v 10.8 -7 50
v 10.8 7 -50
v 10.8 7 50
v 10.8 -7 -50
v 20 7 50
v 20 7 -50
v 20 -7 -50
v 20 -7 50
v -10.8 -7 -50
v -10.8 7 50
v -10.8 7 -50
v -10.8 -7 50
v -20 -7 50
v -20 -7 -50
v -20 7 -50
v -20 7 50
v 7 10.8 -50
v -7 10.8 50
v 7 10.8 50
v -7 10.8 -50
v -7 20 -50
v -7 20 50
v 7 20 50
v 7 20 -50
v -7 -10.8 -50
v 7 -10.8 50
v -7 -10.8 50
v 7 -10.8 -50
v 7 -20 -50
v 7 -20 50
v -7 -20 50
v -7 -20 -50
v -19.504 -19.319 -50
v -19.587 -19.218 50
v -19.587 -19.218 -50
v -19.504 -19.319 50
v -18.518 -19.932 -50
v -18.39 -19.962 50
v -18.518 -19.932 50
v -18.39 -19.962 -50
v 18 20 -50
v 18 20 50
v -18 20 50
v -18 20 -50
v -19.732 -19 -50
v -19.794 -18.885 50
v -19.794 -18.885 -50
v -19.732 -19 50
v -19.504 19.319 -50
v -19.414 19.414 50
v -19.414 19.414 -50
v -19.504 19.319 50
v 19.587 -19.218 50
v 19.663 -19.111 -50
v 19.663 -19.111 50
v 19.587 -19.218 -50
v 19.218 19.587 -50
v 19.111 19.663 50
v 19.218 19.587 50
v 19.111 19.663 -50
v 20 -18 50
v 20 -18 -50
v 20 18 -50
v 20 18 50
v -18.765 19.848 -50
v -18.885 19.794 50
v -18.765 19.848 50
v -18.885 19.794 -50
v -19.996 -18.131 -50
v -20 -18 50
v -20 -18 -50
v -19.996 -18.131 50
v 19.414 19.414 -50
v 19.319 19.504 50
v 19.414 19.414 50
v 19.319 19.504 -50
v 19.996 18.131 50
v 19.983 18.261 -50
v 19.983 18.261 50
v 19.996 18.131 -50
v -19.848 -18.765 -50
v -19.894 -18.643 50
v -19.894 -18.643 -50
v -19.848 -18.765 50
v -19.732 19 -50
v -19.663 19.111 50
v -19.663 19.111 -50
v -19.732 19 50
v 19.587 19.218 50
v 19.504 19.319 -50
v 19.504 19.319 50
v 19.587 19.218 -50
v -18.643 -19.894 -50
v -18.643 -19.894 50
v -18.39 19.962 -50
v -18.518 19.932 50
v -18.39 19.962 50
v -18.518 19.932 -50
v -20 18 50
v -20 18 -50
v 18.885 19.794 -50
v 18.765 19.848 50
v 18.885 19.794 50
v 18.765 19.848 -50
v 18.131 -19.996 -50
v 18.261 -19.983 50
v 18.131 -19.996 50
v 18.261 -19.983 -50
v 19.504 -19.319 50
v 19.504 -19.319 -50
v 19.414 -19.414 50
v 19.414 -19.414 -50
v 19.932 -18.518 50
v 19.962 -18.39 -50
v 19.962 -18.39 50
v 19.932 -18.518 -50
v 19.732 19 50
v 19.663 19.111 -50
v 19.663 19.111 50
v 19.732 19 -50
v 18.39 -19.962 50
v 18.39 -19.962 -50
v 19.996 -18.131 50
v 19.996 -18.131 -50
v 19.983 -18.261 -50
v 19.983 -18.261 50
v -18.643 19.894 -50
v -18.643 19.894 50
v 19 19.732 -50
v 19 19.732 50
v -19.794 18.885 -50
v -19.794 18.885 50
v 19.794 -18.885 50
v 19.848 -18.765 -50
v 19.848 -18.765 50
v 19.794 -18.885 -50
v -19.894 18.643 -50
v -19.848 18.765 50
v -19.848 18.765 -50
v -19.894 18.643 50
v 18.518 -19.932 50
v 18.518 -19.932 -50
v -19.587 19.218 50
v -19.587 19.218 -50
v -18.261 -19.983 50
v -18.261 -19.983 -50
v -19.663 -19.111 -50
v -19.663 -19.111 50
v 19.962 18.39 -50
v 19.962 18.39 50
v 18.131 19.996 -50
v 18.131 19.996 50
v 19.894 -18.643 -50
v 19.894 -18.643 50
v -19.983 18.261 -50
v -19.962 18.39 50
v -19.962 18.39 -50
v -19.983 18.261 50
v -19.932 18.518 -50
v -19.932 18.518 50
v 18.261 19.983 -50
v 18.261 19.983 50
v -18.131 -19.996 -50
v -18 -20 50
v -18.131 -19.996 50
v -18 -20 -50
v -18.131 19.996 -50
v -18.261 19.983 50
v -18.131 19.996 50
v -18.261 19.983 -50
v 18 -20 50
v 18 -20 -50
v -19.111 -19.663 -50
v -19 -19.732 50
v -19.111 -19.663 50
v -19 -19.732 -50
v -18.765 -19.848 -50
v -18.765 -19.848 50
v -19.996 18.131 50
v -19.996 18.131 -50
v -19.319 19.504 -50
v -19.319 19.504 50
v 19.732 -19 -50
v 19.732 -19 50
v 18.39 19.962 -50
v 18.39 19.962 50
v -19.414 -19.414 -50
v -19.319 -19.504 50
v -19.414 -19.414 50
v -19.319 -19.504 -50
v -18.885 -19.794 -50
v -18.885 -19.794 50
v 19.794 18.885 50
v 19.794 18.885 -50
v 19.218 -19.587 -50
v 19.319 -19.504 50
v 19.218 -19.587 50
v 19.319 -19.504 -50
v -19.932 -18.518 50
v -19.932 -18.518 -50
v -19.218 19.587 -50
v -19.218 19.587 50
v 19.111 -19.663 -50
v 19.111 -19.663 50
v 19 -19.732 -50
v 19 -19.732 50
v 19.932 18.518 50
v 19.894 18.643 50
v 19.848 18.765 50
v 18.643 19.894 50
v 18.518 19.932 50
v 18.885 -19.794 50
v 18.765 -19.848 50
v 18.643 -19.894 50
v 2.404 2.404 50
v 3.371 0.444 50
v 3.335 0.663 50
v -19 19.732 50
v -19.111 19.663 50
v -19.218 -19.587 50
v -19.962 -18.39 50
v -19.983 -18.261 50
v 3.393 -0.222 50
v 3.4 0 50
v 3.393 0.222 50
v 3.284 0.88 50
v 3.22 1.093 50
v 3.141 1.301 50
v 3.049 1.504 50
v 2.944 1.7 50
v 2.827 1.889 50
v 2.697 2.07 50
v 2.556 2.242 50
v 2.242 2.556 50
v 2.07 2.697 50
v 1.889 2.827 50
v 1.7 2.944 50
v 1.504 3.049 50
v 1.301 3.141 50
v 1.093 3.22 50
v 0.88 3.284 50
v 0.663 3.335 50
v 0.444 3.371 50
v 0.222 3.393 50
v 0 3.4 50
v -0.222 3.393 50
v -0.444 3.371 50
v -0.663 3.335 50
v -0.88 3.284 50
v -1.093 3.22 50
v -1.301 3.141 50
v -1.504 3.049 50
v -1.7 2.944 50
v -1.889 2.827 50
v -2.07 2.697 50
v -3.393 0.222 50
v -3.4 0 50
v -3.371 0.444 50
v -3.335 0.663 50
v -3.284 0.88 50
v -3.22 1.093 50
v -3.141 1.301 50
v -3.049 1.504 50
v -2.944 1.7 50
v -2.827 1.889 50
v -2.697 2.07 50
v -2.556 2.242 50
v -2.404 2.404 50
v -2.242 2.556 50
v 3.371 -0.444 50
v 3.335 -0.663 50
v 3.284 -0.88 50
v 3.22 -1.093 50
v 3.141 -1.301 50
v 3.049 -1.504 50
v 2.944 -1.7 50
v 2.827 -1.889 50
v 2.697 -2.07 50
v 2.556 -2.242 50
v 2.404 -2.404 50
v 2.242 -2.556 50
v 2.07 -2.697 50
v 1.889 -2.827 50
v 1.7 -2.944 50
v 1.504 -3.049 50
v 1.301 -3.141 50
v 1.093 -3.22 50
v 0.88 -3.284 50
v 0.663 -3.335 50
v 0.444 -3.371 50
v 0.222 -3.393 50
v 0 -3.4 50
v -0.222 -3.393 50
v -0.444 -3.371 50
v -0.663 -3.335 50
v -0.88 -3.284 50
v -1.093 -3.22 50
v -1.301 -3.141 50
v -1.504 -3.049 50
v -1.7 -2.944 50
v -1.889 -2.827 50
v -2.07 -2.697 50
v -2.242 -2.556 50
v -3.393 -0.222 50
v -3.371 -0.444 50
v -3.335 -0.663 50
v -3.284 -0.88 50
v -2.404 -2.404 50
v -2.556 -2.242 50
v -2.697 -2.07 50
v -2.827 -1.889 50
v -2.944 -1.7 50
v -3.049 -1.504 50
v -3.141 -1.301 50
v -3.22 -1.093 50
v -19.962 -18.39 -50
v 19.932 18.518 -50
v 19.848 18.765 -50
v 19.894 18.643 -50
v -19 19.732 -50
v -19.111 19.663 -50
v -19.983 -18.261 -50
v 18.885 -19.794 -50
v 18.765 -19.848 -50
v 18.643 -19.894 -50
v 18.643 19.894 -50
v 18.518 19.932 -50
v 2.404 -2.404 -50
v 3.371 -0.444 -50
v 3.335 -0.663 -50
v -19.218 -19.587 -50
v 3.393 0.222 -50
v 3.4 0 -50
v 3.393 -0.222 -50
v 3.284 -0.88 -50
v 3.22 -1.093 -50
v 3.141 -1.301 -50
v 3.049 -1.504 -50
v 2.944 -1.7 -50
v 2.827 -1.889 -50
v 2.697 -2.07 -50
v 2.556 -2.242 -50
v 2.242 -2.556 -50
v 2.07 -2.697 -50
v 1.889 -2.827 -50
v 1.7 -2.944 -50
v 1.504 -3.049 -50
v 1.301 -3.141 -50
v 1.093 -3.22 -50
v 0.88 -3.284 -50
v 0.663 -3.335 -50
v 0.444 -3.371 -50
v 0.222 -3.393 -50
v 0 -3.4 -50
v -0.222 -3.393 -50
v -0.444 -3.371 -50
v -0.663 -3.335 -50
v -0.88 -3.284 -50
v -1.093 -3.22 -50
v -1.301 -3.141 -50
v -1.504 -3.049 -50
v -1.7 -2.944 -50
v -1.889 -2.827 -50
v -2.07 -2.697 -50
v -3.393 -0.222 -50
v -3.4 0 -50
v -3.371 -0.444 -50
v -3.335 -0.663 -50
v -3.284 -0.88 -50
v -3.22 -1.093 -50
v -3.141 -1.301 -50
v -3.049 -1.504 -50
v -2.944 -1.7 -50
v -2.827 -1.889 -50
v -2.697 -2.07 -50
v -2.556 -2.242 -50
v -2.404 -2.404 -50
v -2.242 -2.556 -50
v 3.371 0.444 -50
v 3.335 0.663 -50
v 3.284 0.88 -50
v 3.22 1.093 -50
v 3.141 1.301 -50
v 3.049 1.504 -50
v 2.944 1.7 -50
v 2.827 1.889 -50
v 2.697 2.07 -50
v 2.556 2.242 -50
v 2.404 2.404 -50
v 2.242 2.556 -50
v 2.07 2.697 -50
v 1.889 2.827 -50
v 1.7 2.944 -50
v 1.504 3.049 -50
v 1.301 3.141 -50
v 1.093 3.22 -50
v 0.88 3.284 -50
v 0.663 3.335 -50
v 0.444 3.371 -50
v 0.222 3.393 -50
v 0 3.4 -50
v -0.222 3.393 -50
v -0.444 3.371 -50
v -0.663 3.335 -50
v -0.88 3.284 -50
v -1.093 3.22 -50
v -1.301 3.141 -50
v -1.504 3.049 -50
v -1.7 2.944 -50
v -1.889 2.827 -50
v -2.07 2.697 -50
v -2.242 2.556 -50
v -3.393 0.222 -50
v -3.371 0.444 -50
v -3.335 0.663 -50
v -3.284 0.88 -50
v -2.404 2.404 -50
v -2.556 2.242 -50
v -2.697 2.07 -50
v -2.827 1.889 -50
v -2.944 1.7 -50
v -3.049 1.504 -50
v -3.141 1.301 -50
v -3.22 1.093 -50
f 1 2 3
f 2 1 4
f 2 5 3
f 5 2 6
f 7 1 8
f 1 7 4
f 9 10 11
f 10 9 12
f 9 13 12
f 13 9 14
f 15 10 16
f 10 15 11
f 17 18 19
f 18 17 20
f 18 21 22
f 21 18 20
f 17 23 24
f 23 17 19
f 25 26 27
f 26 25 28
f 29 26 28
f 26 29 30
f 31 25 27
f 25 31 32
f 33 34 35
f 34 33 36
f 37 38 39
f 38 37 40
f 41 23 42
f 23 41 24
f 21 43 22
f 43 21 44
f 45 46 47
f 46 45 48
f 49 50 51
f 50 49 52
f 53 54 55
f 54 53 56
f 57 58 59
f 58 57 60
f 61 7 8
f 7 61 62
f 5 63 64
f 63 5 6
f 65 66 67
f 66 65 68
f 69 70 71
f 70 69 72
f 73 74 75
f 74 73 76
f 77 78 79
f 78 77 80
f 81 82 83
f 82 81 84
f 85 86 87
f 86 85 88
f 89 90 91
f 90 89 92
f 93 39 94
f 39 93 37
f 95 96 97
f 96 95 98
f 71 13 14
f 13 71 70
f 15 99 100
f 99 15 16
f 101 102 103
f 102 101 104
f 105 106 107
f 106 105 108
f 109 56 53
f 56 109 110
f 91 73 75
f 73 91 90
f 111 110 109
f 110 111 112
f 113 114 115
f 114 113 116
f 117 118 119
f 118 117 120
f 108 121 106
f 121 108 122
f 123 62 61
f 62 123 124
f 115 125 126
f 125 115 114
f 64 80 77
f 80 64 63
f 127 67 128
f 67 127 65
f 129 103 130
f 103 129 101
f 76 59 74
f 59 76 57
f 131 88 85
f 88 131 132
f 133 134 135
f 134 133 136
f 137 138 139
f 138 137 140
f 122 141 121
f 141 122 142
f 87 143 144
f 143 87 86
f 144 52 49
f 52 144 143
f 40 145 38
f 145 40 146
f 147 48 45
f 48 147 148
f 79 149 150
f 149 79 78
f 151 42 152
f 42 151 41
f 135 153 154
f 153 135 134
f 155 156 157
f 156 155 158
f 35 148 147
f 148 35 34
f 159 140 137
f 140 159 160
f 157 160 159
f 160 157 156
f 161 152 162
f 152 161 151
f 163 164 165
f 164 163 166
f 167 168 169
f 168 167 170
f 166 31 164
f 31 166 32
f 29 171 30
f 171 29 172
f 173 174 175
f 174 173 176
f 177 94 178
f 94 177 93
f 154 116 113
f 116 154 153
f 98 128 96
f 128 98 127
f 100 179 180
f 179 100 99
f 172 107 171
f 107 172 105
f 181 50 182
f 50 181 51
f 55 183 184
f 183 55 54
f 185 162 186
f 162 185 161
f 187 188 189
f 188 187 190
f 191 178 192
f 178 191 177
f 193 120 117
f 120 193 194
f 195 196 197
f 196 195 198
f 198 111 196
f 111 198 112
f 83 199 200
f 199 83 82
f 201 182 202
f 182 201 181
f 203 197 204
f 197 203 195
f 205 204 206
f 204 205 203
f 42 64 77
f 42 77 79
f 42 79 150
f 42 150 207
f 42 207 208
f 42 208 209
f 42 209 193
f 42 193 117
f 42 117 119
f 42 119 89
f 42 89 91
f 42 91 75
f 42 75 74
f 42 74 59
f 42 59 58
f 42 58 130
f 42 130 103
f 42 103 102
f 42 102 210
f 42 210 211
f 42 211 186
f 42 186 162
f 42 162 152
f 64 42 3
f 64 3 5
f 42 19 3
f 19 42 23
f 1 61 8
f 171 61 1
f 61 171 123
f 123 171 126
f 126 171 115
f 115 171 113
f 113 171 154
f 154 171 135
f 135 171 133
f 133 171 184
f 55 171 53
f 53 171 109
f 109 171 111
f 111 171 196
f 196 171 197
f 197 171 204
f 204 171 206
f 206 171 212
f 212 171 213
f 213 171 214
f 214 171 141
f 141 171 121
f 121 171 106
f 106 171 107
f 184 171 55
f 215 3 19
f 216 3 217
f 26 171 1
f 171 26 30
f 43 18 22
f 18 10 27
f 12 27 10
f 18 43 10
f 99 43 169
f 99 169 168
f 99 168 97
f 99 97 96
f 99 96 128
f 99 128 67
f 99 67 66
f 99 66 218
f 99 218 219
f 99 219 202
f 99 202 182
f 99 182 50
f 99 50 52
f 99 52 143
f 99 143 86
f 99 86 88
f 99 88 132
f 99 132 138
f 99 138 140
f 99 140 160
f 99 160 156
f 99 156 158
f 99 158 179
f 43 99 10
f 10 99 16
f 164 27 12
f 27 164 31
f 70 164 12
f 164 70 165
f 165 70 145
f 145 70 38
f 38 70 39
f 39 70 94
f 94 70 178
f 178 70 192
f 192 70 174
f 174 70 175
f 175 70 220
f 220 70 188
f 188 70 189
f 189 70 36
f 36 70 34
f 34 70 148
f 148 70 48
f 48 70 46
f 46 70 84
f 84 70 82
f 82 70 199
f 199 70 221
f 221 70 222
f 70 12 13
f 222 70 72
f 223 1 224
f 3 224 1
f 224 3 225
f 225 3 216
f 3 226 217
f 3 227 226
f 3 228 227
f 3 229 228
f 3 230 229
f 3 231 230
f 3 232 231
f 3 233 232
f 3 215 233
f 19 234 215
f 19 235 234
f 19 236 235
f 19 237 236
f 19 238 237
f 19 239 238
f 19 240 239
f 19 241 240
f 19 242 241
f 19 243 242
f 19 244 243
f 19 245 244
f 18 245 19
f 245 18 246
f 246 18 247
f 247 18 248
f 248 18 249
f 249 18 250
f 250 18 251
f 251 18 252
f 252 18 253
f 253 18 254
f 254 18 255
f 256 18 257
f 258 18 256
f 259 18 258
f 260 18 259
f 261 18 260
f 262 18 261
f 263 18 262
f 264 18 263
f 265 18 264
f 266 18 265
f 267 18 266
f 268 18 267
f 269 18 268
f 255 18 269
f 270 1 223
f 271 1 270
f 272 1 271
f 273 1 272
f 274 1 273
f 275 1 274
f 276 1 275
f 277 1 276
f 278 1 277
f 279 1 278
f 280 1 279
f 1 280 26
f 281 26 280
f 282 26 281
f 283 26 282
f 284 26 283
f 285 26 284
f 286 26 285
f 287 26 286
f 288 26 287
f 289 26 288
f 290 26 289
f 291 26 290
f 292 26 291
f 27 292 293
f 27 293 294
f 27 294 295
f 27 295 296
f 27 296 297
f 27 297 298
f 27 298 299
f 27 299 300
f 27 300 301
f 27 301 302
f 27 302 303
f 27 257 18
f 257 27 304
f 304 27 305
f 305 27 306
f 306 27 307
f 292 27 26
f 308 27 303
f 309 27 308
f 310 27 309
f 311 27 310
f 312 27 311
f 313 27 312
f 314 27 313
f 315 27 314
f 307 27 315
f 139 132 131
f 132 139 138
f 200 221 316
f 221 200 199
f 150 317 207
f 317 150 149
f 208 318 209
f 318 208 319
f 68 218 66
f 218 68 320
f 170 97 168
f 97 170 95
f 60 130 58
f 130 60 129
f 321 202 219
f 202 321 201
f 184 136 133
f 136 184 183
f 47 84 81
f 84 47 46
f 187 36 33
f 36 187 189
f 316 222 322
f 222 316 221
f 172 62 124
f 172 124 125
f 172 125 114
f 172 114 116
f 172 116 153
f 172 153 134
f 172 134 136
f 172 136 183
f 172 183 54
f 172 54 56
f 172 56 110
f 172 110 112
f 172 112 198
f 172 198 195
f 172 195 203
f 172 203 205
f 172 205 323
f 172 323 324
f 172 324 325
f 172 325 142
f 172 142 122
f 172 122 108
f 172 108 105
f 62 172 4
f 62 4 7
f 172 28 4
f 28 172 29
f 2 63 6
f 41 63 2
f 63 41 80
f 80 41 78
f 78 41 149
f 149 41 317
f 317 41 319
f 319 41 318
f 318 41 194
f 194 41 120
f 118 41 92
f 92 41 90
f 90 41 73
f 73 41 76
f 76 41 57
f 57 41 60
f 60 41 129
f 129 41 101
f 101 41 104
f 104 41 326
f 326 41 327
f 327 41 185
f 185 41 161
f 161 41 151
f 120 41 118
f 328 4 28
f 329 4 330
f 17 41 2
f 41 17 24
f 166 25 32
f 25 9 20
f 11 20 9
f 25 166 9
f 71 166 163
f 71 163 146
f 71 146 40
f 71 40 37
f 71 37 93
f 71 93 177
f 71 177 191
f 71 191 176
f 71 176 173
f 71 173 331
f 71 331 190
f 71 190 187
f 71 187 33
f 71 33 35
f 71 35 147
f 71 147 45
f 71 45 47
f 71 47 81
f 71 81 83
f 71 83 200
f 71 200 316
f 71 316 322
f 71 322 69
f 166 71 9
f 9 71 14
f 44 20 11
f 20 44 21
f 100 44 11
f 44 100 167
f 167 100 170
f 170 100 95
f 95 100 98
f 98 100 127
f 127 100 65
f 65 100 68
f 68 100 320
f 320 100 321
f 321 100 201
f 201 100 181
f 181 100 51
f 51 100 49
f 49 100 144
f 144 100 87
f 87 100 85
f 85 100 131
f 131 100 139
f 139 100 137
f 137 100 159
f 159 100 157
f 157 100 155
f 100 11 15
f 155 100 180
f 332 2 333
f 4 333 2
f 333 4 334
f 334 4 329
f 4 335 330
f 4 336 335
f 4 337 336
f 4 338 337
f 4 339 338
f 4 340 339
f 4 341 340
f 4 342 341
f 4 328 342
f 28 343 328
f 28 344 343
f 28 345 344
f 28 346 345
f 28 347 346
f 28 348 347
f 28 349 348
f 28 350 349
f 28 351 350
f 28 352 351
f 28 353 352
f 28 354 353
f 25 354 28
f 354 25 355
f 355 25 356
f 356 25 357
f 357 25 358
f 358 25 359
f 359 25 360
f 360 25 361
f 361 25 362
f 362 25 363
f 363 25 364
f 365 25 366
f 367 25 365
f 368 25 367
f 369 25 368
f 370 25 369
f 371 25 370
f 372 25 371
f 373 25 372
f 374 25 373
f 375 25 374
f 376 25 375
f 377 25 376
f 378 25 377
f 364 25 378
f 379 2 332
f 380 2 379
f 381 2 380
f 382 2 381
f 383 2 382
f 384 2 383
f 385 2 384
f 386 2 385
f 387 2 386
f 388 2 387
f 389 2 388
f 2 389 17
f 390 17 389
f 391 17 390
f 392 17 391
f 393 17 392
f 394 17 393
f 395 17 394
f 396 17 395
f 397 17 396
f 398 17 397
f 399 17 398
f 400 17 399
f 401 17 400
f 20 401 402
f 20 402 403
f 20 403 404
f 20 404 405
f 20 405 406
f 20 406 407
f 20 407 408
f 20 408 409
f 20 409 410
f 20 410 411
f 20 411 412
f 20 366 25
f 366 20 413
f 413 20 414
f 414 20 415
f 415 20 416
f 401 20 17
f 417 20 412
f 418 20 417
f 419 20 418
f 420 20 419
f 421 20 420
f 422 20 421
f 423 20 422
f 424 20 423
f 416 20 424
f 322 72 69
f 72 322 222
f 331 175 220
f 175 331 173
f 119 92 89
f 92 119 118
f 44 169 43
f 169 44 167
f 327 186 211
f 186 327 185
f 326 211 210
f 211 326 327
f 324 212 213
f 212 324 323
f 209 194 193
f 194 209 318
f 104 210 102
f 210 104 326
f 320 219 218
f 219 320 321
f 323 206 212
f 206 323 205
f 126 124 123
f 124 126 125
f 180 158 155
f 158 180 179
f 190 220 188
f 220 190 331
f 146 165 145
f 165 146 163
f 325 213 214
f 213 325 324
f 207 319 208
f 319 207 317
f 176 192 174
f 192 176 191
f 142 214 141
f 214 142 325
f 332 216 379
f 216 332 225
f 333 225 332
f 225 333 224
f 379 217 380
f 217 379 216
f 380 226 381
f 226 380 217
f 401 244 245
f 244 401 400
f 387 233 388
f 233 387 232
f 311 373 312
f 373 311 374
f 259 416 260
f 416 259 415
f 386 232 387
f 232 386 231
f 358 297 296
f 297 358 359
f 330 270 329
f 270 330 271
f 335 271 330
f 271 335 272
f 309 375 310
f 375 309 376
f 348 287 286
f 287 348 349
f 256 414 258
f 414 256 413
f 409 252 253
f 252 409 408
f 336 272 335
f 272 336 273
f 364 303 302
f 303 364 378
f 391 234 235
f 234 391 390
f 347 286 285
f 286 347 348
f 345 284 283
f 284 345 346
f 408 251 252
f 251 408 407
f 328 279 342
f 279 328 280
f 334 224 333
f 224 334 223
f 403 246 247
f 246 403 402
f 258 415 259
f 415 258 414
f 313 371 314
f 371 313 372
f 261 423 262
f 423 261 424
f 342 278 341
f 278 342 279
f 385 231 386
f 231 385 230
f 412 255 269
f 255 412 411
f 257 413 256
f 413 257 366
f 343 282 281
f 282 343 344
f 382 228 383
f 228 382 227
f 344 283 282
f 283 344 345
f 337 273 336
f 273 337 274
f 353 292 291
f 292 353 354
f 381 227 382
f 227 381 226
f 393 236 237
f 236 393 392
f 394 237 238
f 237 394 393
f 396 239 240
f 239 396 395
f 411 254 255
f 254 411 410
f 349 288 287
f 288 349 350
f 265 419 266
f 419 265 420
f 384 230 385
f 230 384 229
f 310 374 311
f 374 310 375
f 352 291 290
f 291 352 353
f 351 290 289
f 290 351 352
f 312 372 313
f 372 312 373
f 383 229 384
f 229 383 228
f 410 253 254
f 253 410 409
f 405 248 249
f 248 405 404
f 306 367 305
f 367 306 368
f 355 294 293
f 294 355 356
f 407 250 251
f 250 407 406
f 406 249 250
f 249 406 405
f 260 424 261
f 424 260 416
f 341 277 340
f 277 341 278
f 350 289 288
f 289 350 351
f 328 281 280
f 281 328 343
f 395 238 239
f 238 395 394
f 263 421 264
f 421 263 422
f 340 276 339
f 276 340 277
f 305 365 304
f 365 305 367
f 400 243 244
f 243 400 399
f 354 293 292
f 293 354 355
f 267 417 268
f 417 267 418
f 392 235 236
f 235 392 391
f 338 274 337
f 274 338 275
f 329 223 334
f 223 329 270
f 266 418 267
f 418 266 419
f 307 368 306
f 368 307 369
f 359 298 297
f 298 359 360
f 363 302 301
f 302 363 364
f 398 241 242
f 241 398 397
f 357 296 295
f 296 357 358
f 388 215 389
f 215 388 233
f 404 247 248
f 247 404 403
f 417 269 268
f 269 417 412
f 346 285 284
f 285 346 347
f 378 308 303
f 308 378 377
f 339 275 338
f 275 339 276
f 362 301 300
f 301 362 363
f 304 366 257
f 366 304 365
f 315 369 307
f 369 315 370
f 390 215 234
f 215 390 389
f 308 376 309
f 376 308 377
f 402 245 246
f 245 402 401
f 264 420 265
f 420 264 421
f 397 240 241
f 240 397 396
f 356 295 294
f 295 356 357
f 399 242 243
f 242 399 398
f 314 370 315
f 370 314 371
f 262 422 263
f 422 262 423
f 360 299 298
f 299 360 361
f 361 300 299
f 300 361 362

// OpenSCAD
// 40x40 T-slot aluminium extrusion (simplified, standard-looking), 100mm long
// One connected solid; all placements derived from dimensions.

$fn = 96;

// Parameters
profile_W = 40.0;
profile_H = 40.0;
length_L  = 100.0;

// Typical 40-series features (approximate)
corner_radius_r = 2.0;

center_bore_d = 6.8;          // through bore
slot_opening_w = 8.0;         // mouth width at outer face
slot_opening_depth = 2.2;     // how far the narrow mouth goes in
slot_cavity_w = 14.0;         // wider internal cavity width
slot_cavity_depth = 9.0;      // depth of cavity from outer face

// Keep enough material between cavity and center bore
slot_web_thickness = 2.0;

overlap_eps = 0.2;

// Helpers
function clamp(v, lo, hi) = v < lo ? lo : (v > hi ? hi : v);

// Rounded outer body (2D) then extrude
module rounded_rect_2d(w, h, r) {
    r2 = clamp(r, 0, min(w, h)/2);
    hull() {
        for (sx = [-1, 1], sy = [-1, 1])
            translate([sx*(w/2 - r2), sy*(h/2 - r2)]) circle(r=r2);
    }
}

module outer_body() {
    linear_extrude(height=length_L, center=true)
        rounded_rect_2d(profile_W, profile_H, corner_radius_r);
}

module center_bore() {
    cylinder(h=length_L + 2*overlap_eps, r=center_bore_d/2, center=true);
}

// Single side T-slot cut (points outward along +X), then rotate for other sides
module tslot_cut_posX() {
    // Limit cavity depth so it doesn't break into the center bore web
    max_cavity_depth = profile_W/2 - center_bore_d/2 - slot_web_thickness;
    cav_d = clamp(slot_cavity_depth, 0, max_cavity_depth);

    // Mouth: narrow slot near the outer face
    mouth_center_x = profile_W/2 - slot_opening_depth/2;
    // Cavity: wider slot behind the mouth
    cavity_center_x = profile_W/2 - cav_d/2;

    union() {
        translate([mouth_center_x, 0, 0])
            cube([slot_opening_depth + 2*overlap_eps,
                  slot_opening_w,
                  length_L + 2*overlap_eps], center=true);

        translate([cavity_center_x, 0, 0])
            cube([cav_d + 2*overlap_eps,
                  slot_cavity_w,
                  length_L + 2*overlap_eps], center=true);
    }
}

module all_tslots() {
    union() {
        tslot_cut_posX();
        rotate([0,0,180]) tslot_cut_posX();
        rotate([0,0, 90]) tslot_cut_posX();
        rotate([0,0,-90]) tslot_cut_posX();
    }
}

// Final model
difference() {
    outer_body();
    center_bore();
    all_tslots();
}
